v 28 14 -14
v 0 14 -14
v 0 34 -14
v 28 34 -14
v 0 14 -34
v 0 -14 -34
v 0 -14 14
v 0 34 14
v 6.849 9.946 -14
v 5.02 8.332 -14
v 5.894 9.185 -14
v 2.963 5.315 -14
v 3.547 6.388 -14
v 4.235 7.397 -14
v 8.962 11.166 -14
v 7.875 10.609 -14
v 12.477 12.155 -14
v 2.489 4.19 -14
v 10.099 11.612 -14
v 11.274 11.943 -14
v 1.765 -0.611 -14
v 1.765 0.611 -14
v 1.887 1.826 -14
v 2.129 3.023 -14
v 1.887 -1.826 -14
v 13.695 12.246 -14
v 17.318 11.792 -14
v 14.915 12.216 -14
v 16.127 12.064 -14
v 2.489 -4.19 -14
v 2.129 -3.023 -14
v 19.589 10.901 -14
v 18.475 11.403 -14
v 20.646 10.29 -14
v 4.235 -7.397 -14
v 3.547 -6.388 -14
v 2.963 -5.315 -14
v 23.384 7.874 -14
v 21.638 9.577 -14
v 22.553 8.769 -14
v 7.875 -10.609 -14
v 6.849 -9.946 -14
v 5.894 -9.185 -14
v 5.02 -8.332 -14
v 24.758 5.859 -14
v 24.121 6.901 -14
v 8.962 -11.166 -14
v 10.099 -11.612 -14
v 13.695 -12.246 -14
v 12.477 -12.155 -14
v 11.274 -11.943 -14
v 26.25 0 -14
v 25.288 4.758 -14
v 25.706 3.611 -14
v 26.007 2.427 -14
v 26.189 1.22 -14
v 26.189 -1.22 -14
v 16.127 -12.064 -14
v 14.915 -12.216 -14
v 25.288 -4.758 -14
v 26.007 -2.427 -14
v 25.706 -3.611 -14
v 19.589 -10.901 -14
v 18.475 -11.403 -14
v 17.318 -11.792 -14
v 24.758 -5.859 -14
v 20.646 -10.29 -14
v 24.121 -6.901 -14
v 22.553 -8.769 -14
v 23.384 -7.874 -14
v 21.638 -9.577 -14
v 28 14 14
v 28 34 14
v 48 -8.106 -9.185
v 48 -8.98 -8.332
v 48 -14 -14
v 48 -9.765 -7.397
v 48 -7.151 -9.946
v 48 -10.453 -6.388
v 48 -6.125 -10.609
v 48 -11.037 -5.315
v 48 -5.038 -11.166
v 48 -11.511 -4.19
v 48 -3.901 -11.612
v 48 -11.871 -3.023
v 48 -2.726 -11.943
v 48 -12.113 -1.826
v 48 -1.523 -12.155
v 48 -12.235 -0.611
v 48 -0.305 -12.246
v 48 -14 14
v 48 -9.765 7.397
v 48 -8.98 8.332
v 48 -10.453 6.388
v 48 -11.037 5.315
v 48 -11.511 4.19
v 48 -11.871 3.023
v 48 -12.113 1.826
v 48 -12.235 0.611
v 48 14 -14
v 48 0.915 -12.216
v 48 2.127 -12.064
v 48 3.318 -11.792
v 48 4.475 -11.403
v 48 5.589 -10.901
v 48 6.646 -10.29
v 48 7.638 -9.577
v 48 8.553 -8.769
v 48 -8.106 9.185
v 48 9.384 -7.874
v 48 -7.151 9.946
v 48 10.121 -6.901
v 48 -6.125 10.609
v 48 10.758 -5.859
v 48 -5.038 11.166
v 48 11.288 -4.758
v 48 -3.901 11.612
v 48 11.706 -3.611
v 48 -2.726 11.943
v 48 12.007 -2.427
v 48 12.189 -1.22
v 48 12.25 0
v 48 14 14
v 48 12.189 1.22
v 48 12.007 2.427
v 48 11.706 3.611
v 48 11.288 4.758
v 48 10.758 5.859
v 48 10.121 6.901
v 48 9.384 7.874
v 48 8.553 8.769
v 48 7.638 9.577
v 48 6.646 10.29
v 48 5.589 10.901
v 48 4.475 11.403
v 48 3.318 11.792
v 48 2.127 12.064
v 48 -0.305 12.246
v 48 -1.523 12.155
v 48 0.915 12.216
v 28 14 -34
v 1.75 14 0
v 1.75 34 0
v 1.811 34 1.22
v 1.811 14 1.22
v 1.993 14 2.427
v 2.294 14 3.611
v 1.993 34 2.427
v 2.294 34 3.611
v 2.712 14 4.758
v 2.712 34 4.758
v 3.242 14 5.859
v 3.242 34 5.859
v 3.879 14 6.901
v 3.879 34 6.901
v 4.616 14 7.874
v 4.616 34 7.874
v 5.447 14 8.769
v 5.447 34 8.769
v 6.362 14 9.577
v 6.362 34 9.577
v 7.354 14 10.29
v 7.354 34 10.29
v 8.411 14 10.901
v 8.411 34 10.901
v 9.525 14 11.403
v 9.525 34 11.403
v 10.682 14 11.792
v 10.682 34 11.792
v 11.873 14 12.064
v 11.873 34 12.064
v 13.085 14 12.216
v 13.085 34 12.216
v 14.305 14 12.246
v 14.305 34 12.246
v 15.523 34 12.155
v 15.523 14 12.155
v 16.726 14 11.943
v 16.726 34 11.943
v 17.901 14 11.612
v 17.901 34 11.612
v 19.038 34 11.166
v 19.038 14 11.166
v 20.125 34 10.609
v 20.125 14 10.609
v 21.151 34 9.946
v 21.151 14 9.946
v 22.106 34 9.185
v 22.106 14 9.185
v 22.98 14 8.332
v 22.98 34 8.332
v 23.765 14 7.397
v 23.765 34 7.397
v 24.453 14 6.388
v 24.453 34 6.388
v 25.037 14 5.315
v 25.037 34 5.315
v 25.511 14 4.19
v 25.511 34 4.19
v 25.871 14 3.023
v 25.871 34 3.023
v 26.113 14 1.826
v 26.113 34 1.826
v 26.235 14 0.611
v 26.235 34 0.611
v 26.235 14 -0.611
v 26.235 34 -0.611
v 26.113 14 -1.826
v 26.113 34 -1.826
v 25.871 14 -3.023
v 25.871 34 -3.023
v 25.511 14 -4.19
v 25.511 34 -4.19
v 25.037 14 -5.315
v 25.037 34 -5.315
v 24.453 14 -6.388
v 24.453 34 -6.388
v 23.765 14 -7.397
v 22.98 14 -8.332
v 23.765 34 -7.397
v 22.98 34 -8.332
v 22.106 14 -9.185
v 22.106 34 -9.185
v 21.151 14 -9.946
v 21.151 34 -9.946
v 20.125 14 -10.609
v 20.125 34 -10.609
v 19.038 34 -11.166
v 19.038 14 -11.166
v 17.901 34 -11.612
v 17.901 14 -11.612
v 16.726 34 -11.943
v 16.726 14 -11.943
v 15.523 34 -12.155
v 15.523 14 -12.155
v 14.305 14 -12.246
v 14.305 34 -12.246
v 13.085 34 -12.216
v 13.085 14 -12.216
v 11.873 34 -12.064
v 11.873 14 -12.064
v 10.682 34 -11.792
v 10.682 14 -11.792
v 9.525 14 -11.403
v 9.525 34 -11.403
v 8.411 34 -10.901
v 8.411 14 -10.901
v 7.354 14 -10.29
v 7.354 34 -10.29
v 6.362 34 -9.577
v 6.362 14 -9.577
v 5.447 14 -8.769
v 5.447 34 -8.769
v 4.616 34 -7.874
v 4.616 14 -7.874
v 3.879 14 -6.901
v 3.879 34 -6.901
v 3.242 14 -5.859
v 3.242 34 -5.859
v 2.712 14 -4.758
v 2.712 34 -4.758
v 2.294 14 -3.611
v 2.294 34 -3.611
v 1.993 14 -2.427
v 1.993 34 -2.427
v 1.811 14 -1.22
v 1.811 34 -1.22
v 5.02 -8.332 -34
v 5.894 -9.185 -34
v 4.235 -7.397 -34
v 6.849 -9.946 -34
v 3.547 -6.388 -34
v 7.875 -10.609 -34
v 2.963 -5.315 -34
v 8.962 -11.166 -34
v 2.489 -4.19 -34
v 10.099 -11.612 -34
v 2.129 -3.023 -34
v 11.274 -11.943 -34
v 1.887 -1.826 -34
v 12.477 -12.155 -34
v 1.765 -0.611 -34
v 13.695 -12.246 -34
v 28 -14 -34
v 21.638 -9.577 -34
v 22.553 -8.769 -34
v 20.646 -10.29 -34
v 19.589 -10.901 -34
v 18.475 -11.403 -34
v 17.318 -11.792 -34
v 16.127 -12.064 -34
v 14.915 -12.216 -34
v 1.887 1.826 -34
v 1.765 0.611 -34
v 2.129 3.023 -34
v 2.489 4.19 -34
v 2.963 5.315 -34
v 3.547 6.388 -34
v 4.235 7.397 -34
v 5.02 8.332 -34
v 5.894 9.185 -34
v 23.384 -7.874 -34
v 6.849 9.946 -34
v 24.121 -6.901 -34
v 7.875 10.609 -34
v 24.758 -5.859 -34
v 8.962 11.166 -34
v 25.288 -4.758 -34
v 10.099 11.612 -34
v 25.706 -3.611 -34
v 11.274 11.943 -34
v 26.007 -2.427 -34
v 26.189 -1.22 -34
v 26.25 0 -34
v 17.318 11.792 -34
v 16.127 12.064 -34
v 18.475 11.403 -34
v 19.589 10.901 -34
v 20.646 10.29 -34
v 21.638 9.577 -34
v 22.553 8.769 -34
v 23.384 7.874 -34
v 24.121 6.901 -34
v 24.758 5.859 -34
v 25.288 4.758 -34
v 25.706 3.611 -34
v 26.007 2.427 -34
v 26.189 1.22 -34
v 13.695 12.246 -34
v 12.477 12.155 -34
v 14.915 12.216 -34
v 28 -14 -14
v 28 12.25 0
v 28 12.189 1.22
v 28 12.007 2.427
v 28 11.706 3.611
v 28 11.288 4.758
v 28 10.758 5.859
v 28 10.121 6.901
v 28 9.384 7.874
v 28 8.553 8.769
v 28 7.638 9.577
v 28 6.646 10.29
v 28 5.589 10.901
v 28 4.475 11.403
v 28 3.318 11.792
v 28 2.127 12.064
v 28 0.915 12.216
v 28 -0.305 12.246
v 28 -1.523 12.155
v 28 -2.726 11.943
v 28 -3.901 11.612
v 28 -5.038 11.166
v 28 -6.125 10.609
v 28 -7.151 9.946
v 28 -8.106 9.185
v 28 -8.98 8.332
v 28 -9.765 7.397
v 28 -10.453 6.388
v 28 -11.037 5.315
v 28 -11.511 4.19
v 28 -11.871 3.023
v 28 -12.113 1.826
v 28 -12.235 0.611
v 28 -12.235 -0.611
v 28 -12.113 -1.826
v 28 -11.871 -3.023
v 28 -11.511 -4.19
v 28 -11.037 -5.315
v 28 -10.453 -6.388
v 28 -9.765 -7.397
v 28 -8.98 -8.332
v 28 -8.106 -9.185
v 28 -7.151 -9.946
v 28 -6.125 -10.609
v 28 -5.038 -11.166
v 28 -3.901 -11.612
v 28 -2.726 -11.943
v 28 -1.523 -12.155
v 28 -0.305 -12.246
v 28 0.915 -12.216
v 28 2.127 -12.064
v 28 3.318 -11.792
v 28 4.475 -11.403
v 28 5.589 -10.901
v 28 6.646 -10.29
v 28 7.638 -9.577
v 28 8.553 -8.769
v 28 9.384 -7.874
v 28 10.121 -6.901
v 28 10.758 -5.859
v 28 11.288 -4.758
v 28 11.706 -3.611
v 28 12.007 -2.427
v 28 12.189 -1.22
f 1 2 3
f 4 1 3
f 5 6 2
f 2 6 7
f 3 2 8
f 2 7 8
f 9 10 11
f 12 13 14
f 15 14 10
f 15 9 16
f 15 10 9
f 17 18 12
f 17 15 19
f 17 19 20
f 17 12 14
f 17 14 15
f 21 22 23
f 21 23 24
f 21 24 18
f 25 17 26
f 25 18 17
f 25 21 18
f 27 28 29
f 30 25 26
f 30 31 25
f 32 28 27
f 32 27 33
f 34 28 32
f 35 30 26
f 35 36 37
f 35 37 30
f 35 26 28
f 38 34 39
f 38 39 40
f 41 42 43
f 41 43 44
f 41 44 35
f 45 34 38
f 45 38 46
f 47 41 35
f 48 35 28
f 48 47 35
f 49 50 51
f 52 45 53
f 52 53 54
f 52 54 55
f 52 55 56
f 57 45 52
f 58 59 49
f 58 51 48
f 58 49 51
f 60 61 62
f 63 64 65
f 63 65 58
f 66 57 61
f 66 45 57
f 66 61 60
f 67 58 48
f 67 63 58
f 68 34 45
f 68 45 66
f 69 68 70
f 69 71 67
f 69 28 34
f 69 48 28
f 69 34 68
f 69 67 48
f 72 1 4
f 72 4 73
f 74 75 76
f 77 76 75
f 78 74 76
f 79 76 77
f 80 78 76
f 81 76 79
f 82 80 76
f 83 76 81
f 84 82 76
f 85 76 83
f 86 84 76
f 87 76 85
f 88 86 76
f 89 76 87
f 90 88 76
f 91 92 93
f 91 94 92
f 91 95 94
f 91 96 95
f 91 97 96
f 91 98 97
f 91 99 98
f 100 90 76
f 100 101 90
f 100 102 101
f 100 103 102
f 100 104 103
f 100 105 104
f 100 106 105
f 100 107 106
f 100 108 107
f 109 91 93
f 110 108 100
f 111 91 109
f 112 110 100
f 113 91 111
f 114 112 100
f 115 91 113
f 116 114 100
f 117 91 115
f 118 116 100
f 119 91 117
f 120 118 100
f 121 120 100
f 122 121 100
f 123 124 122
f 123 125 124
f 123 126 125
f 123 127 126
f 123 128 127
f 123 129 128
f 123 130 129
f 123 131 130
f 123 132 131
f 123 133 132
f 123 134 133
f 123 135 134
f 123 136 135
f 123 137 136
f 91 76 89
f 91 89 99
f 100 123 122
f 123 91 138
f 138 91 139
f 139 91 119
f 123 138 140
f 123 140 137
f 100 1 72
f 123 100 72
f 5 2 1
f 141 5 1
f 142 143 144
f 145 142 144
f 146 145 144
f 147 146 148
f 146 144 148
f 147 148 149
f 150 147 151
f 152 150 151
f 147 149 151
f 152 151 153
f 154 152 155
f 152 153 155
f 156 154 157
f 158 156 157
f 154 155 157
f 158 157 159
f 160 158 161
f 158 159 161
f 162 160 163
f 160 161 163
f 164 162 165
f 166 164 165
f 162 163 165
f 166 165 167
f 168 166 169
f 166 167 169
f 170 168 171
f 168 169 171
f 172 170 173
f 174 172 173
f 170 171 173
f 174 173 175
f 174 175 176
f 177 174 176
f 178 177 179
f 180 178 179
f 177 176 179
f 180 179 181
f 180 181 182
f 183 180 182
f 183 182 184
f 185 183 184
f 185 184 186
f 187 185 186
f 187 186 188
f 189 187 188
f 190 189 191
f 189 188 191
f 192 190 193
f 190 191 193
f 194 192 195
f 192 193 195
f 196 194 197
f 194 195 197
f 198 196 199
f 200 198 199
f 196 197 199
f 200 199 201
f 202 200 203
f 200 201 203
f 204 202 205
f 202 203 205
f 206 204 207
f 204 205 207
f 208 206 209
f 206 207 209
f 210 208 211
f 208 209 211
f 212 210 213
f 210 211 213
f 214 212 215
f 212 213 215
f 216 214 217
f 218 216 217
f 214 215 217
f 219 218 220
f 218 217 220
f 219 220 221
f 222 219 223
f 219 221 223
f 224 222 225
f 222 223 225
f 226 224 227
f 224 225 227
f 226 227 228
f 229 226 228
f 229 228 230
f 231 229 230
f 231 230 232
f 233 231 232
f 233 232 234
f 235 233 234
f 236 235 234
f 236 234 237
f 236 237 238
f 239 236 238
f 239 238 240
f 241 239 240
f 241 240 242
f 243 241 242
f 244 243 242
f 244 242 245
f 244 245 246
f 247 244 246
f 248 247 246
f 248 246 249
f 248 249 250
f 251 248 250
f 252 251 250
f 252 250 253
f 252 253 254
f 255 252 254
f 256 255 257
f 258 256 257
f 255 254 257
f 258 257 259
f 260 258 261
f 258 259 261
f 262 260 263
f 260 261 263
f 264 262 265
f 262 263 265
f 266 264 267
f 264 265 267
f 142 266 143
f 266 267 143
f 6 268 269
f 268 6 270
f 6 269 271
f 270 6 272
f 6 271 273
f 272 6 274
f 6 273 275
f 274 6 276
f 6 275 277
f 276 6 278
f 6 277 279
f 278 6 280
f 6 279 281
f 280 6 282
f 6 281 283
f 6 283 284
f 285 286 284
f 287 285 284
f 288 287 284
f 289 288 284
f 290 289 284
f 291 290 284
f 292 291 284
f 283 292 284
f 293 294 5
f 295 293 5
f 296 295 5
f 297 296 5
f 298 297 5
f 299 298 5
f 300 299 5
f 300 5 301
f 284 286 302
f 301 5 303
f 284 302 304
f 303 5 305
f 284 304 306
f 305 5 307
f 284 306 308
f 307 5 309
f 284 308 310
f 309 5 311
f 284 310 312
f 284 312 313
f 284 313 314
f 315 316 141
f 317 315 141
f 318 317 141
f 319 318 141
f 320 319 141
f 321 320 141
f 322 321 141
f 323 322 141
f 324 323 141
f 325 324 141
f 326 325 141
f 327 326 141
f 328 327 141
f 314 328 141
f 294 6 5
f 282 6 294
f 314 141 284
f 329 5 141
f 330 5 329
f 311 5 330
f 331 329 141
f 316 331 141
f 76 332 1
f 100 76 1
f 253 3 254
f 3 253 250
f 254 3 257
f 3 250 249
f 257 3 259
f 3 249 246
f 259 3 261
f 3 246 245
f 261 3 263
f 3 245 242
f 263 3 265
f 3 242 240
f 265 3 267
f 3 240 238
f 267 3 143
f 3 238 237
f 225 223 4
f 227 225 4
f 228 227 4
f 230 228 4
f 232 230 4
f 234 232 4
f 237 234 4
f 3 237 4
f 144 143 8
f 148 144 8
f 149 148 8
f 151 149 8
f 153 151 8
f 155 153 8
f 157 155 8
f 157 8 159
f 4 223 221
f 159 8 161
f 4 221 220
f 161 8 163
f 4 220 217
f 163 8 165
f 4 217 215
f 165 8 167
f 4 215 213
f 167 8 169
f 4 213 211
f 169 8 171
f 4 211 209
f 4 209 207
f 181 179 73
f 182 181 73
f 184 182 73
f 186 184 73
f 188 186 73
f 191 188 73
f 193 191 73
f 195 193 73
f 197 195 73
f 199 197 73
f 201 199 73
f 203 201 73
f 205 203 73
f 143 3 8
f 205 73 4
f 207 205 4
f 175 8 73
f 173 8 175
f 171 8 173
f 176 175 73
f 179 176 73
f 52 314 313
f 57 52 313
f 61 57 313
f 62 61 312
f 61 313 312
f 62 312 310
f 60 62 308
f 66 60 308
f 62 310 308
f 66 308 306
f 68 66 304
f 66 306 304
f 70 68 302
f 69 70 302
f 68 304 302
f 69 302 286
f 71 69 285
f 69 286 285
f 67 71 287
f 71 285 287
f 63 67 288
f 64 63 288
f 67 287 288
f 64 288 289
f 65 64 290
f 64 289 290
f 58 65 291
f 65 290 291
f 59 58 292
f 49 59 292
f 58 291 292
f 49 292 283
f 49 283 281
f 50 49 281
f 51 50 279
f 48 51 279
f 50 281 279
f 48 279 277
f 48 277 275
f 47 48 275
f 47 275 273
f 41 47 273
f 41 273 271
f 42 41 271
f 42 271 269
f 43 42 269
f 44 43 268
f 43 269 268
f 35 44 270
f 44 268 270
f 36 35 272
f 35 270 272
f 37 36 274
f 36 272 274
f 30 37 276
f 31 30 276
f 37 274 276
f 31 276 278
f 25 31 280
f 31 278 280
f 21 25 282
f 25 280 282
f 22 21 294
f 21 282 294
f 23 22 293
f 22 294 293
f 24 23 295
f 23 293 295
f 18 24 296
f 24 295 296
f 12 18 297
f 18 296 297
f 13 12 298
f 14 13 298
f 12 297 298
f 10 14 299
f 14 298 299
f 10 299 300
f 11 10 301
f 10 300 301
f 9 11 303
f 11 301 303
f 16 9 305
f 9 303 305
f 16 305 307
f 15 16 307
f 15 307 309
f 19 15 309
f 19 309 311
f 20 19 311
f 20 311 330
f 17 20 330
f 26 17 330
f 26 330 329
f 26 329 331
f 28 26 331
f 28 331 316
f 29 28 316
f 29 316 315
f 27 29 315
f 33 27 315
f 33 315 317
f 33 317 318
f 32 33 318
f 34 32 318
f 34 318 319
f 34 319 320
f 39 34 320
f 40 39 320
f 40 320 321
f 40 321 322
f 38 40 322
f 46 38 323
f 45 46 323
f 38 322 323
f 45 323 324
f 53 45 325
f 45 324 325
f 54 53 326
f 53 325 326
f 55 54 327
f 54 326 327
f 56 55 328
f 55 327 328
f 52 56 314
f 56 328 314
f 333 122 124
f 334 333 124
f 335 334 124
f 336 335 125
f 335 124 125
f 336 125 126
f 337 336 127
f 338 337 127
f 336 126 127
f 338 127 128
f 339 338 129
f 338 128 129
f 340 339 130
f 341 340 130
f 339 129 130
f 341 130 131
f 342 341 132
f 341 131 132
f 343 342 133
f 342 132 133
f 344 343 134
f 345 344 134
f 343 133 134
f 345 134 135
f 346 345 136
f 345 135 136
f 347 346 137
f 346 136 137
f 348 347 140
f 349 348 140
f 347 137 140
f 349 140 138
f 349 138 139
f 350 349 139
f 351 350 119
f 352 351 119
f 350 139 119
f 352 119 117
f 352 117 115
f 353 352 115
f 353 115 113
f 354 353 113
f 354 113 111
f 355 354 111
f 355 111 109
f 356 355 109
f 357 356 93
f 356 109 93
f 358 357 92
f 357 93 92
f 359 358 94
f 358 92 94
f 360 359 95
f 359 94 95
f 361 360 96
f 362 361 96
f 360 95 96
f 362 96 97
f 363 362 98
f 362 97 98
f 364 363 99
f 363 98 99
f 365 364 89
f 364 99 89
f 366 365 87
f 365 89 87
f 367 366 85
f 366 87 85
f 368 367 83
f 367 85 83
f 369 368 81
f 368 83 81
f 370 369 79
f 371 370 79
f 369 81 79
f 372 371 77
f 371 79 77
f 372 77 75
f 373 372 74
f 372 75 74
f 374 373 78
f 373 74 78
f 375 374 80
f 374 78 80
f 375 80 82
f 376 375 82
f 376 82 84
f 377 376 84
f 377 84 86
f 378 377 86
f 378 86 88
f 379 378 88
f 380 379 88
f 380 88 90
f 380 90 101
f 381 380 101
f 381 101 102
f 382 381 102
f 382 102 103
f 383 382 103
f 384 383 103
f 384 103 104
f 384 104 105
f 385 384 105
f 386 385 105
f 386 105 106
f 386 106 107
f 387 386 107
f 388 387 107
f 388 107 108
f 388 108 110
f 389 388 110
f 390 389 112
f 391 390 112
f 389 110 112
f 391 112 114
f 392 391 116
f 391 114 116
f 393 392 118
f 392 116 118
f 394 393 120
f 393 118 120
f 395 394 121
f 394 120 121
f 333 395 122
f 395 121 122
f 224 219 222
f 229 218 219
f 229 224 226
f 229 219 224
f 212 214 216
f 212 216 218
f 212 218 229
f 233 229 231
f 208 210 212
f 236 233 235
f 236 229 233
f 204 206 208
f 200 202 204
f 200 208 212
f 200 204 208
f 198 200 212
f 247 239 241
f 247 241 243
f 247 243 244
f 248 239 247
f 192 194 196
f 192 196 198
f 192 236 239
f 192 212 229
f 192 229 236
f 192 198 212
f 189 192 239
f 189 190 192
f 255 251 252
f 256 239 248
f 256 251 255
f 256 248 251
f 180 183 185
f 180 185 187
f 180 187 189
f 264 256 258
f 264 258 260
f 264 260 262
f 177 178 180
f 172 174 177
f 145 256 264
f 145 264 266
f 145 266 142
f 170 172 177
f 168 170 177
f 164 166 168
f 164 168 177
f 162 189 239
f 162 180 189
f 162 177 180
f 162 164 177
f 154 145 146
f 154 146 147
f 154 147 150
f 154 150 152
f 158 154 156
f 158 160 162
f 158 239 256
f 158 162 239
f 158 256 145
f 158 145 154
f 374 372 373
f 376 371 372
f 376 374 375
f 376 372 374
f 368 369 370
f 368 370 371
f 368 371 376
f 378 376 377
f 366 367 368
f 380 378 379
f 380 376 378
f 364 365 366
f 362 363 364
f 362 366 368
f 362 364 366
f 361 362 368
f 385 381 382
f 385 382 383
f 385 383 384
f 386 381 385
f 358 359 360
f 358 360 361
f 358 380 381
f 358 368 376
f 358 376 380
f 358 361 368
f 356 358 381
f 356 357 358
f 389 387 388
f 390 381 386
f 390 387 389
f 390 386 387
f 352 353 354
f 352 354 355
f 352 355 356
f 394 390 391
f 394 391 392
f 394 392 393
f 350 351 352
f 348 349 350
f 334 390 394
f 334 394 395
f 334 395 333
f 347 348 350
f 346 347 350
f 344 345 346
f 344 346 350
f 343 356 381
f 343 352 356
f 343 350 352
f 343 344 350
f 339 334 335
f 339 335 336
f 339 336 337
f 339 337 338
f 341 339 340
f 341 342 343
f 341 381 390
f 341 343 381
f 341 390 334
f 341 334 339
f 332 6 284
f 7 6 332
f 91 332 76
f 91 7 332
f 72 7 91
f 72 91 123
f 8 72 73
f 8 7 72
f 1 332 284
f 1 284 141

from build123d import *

# Parameters (mm, degrees)
F0_W      = 28
F0_H      = 28
F1_DEPTH  = 48
F2_W      = 28
F2_H      = 28
F3_DEPTH  = 48
F4_W      = 28
F4_H      = 28
F5_DEPTH  = 48
F6_R      = 12.25
F7_DEPTH  = 20
F8_R      = 12.25
F9_DEPTH  = 20
F10_R     = 12.25
F11_DEPTH = 20


with BuildPart() as f1:
    # F0 (on Right) → F1 (new body)
    with BuildSketch(Plane.YZ):
        Rectangle(F0_W, F0_H)
    extrude(amount=F1_DEPTH)

    # F2 (on face) → F3 (join)
    with BuildSketch(Plane.XZ.offset(14)):
        with Locations((14, 0)):
            Rectangle(F2_W, F2_H)
    extrude(amount=-F3_DEPTH)

    # F4 (on face) → F5 (join)
    with BuildSketch(Plane.XY.offset(14)):
        with Locations((14, 0)):
            Rectangle(F4_W, F4_H)
    extrude(amount=-F5_DEPTH)

    # F6 (on face) → F7 (cut)
    with BuildSketch(Plane.YZ.offset(48)):
        Circle(F6_R)
    extrude(amount=-F7_DEPTH, mode=Mode.SUBTRACT)

    # F8 (on face) → F9 (cut)
    with BuildSketch(Plane(origin=(0, 34, 0), x_dir=(-1, 0, 0), z_dir=(0, 1, 0))):
        with Locations((-14, 0)):
            Circle(F8_R)
    extrude(amount=-F9_DEPTH, mode=Mode.SUBTRACT)

    # F10 (on face) → F11 (cut)
    with BuildSketch(Plane(origin=(0, 0, -34), x_dir=(1, 0, 0), z_dir=(0, 0, -1))):
        with Locations((14, 0)):
            Circle(F10_R)
    extrude(amount=-F11_DEPTH, mode=Mode.SUBTRACT)


solid = f1.part
